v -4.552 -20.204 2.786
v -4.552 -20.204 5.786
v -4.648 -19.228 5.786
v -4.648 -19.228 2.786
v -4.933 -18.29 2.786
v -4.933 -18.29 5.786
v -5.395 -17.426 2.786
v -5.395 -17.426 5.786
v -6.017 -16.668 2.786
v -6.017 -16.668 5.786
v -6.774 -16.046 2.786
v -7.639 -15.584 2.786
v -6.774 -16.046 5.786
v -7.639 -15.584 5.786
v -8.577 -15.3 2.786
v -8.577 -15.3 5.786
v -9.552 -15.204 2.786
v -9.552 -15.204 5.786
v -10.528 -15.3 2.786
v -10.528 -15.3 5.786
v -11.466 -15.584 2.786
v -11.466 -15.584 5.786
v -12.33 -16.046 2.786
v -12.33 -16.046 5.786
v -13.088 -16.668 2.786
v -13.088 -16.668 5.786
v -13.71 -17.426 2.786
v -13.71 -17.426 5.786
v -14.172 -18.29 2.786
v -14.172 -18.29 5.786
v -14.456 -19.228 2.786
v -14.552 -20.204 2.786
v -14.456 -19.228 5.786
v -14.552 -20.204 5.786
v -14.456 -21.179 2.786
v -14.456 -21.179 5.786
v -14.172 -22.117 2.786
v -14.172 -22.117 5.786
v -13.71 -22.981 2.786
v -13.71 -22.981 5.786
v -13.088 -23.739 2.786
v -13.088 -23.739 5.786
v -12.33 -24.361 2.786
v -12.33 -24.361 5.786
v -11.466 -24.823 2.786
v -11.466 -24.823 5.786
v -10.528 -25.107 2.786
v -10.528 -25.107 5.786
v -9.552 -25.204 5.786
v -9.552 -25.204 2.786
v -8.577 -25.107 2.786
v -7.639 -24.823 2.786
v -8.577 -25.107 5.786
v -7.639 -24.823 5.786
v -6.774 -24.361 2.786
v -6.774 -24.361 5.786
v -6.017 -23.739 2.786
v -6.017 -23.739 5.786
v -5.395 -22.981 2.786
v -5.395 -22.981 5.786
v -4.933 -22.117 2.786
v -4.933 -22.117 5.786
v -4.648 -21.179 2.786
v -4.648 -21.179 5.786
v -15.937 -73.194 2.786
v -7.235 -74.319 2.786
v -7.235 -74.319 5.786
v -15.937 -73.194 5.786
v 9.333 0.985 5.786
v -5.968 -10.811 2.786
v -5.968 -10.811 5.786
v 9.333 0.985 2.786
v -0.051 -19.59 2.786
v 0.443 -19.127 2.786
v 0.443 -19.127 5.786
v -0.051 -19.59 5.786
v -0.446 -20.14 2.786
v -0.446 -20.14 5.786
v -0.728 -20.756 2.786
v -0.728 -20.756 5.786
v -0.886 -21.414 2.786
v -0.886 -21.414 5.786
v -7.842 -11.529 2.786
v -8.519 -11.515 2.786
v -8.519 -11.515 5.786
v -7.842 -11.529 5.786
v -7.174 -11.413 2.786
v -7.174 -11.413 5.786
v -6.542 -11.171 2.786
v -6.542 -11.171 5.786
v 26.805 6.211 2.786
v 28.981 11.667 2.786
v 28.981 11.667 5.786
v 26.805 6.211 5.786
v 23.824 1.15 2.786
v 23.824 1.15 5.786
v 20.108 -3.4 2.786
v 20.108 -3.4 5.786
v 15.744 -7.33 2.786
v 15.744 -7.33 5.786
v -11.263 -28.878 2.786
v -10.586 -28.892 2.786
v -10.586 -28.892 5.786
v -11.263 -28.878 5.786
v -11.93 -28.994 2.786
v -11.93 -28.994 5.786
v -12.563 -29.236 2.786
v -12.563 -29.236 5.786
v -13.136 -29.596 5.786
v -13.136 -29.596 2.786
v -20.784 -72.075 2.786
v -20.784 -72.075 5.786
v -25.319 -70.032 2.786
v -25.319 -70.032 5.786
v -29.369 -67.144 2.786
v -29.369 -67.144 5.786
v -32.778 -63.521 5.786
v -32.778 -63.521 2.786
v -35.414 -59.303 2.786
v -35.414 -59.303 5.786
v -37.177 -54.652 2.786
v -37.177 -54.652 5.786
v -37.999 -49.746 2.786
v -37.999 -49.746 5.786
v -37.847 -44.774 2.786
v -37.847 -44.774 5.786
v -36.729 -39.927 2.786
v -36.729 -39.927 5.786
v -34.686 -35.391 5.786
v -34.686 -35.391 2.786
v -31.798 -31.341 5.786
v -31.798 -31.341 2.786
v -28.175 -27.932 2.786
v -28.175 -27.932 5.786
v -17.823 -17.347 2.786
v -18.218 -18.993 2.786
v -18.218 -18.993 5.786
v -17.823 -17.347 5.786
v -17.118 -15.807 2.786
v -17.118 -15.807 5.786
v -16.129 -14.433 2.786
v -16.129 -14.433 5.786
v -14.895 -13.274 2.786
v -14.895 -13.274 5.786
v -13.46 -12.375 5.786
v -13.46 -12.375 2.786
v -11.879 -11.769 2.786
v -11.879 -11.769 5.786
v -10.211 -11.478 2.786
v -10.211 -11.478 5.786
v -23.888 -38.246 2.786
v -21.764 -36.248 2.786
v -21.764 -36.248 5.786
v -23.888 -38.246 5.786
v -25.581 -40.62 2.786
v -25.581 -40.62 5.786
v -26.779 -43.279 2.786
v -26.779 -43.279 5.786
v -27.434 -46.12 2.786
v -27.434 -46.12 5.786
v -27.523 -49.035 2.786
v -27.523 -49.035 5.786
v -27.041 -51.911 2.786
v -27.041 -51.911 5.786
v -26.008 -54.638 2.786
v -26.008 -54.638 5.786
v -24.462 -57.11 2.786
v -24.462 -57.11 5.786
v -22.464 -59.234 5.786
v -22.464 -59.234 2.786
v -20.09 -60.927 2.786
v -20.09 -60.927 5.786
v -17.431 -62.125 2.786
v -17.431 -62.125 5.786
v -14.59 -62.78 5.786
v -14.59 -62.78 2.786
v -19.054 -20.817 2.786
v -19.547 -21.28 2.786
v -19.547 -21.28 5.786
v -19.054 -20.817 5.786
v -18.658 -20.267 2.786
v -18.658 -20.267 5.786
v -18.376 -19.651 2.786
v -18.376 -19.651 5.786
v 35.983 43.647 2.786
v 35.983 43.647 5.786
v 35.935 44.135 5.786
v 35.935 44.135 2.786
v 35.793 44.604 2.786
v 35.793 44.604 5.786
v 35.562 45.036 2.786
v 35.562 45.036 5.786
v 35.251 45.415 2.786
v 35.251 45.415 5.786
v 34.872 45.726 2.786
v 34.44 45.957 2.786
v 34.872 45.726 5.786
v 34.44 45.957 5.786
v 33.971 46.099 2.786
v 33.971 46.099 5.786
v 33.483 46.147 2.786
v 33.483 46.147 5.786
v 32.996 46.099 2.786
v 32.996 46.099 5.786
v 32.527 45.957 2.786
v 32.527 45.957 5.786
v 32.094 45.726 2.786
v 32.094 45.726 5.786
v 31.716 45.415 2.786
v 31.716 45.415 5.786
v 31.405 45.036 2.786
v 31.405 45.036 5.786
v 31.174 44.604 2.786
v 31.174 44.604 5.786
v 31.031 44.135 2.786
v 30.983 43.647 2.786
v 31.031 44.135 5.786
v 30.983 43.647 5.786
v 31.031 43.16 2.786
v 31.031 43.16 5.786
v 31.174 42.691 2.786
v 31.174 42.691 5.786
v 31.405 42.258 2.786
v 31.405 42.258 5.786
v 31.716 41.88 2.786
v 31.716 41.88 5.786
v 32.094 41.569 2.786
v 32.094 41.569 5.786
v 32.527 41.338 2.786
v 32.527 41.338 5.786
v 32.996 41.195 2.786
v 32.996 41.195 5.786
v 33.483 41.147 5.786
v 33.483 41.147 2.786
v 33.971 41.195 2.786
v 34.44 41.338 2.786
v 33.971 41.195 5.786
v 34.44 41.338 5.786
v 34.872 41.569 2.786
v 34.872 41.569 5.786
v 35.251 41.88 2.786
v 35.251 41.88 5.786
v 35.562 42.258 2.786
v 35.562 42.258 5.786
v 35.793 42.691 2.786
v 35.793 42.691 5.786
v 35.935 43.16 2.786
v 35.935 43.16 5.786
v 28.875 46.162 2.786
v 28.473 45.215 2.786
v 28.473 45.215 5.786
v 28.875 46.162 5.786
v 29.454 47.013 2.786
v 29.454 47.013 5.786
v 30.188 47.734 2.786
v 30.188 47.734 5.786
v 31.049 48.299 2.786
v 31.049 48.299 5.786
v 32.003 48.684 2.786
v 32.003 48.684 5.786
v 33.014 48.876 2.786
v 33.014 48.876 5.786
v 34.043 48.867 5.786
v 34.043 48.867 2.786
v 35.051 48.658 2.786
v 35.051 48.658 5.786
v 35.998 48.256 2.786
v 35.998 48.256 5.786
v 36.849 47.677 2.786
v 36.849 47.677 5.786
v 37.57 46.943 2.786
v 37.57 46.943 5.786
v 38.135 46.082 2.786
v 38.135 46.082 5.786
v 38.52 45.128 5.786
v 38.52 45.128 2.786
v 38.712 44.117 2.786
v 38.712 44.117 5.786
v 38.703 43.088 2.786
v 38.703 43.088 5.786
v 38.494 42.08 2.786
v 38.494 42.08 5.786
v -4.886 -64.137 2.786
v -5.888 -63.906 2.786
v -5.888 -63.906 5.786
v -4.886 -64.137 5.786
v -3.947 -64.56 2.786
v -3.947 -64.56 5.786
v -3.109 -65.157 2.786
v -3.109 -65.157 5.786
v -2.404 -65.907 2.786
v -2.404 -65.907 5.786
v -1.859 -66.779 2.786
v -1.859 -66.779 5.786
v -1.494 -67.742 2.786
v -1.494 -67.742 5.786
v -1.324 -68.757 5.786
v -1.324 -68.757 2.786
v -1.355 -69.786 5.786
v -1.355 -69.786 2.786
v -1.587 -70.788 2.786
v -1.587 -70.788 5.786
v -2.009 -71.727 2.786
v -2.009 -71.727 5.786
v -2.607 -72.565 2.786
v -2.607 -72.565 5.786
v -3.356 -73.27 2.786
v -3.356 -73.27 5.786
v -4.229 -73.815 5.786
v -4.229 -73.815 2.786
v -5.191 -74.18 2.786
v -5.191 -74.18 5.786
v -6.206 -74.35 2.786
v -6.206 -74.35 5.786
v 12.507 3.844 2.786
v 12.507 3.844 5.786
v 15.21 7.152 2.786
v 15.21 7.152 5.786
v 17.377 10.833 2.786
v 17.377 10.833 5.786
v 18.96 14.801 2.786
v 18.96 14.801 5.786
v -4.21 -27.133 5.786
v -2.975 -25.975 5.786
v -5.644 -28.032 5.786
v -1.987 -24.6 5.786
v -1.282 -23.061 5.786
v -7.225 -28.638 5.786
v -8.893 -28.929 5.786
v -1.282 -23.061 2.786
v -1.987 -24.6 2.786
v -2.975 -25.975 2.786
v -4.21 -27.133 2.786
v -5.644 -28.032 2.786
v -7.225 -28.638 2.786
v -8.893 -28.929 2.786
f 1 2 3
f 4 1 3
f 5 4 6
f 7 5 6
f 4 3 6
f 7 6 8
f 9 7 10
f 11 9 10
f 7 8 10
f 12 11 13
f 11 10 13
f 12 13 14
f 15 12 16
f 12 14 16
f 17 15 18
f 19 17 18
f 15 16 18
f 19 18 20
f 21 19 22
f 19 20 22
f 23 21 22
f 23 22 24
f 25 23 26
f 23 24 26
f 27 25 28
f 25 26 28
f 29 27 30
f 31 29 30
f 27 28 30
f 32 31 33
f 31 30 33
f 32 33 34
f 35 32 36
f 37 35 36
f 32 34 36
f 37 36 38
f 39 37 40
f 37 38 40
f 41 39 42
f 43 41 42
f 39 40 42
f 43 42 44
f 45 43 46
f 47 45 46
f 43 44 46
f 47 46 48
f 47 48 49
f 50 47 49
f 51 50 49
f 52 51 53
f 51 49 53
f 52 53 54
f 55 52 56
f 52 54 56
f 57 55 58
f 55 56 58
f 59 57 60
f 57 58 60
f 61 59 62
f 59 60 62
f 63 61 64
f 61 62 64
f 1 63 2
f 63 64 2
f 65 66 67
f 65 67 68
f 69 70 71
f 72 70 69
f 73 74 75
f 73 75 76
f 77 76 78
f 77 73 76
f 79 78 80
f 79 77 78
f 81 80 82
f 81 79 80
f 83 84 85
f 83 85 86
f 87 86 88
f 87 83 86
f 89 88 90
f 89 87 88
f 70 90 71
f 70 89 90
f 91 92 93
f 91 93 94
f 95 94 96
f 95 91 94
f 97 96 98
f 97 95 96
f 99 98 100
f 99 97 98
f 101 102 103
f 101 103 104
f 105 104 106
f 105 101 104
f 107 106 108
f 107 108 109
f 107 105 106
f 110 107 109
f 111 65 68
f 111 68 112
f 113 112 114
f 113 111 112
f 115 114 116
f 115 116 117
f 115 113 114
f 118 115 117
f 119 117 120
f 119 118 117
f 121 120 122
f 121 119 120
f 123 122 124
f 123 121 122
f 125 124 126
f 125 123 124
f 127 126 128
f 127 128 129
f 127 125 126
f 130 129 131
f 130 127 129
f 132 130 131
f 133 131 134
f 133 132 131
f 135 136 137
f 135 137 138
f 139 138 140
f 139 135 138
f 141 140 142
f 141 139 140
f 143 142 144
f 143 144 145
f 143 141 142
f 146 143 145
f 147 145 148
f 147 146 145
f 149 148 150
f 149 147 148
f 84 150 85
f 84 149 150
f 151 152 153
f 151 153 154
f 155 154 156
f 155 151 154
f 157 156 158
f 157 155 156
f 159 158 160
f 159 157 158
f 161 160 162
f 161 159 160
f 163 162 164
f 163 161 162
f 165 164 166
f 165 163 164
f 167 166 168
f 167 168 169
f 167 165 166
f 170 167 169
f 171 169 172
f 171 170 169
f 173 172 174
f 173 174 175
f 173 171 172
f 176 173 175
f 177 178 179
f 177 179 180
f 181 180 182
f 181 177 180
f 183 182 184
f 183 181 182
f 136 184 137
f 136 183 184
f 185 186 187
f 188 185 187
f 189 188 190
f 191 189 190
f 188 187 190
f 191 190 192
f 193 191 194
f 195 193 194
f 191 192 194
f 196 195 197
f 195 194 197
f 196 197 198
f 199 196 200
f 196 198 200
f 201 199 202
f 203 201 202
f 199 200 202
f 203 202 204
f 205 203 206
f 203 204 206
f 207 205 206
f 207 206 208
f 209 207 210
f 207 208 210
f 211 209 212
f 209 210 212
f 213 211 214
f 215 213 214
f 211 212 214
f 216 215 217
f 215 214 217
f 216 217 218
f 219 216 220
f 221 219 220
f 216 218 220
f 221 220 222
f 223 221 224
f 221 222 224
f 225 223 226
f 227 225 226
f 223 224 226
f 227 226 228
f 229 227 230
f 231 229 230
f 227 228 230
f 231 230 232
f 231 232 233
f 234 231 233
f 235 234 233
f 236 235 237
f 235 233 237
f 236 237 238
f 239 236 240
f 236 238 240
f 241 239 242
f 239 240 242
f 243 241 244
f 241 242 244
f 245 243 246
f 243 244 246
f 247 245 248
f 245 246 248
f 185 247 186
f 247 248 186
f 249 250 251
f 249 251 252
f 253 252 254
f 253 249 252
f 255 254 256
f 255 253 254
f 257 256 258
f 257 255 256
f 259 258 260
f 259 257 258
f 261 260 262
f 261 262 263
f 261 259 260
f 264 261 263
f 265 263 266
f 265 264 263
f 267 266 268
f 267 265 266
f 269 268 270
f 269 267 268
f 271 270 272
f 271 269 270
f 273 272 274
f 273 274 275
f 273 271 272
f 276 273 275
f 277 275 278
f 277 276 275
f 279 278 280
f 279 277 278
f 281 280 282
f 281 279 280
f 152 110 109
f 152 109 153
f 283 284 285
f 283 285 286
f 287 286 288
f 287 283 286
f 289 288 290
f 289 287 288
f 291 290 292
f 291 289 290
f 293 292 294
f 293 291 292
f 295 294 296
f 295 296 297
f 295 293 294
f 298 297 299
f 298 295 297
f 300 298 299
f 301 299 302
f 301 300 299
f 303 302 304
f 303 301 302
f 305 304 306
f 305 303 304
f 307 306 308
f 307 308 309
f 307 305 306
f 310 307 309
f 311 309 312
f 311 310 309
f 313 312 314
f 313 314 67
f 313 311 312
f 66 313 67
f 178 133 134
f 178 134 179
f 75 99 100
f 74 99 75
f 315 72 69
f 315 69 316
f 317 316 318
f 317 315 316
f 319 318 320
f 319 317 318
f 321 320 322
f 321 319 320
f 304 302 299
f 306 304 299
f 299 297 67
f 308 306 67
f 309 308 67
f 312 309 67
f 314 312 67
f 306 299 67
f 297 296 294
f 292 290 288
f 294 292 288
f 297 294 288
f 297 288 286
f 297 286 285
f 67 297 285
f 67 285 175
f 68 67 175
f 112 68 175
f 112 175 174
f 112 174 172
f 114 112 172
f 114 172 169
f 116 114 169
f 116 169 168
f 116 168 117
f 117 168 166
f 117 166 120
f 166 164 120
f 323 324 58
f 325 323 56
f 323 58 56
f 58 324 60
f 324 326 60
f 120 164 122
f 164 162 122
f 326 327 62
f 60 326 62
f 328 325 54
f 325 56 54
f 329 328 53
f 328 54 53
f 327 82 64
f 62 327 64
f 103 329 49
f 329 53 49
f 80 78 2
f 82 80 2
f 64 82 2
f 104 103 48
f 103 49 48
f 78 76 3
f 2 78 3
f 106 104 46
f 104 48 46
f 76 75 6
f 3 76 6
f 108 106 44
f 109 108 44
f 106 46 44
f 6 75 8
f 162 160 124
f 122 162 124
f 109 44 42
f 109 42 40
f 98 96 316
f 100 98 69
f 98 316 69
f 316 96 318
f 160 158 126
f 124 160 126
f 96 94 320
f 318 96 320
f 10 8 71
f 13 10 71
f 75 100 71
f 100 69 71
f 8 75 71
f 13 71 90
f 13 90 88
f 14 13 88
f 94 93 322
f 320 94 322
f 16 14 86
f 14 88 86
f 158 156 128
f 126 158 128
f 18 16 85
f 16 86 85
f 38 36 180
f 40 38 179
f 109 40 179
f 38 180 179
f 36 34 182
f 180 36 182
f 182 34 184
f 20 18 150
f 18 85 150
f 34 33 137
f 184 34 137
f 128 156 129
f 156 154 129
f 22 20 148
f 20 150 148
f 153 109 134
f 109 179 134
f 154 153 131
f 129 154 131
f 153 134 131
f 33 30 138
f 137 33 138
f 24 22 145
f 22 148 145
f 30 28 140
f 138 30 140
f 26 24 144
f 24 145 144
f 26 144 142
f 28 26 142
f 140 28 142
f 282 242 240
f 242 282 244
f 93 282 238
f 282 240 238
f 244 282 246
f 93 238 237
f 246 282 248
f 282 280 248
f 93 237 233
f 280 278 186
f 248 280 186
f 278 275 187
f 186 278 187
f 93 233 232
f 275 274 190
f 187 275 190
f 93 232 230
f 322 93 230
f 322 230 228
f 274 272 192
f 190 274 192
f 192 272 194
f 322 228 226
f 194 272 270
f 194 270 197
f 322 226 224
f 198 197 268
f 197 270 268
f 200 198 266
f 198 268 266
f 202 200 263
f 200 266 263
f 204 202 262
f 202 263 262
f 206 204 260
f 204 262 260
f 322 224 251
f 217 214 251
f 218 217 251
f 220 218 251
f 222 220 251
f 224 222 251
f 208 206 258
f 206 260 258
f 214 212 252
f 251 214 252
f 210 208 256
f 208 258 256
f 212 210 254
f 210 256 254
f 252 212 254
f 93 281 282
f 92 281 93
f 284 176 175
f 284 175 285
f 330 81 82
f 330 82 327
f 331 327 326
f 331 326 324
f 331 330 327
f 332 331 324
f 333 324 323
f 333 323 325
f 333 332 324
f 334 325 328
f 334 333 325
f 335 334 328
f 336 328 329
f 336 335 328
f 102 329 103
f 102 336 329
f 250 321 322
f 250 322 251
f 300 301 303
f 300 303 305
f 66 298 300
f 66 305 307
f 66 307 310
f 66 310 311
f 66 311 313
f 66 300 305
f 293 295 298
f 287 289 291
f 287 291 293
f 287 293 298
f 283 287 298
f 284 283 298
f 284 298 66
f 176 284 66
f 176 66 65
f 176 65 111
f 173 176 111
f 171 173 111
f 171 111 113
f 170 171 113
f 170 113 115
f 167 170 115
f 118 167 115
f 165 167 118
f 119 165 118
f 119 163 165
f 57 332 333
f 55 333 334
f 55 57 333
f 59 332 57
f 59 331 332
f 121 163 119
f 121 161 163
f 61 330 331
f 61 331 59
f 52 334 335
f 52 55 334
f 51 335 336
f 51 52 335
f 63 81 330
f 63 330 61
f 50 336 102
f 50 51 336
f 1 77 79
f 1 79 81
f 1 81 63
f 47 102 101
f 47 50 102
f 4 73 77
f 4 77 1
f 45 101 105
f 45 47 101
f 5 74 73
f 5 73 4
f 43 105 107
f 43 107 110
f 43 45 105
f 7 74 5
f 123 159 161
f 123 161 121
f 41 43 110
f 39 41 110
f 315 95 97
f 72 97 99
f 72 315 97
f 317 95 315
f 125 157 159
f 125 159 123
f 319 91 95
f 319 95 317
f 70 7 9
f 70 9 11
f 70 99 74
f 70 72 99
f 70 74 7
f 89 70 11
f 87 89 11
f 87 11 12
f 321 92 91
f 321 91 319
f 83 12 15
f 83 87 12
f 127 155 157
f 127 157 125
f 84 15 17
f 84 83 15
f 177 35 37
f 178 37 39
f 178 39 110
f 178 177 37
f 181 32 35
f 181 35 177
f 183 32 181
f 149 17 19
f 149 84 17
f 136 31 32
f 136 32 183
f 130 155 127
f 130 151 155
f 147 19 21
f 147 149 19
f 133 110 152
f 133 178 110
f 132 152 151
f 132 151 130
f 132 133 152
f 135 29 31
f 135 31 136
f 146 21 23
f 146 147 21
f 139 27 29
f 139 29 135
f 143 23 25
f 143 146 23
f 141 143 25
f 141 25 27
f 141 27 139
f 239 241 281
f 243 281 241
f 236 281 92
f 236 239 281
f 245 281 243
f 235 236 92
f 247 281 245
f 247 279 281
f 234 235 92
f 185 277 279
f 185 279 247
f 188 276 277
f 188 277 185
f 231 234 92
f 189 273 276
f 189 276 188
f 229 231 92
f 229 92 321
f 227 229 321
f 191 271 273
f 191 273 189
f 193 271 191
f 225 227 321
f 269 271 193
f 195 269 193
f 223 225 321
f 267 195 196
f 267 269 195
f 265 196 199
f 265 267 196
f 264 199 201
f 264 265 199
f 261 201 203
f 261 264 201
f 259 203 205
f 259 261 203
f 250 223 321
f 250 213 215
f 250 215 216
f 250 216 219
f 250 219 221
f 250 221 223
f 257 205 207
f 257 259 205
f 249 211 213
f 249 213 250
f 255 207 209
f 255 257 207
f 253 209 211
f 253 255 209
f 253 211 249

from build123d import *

# Parameters (mm, degrees)
BOSS_EXTRUDE1_DEPTH = 8.571428571
SCALE1_SCALE        = 0.35
SKETCH4_R           = 5
SKETCH4_R_2         = 2.5
CUT_EXTRUDE1_DEPTH  = 3


with BuildPart() as part:
    # Sketch1 → Boss-Extrude1 (new body)
    with BuildSketch(Plane.XY):
        with BuildLine():
            Line((58.123111297, 76.596610431), (85.302723175, 163.49128587))
            ThreePointArc((85.302723175, 163.49128587), (104.096629497, 173.329430267), (113.934773893, 154.535523945))
            Line((113.934773893, 154.535523945), (86.755162015, 67.640848506))
            ThreePointArc((86.755162015, 67.640848506), (72.021658749, 37.591328154), (48.934001898, 13.363041111))
            Line((48.934001898, 13.363041111), (5.217217629, -20.341042592))
            ThreePointArc((5.217217629, -20.341042592), (2.676812565, -23.236266616), (1.419146317, -26.876906073))
            ThreePointArc((1.419146317, -26.876906073), (-8.076031964, -43.216564777), (-26.293681135, -48.242509049))
            ThreePointArc((-26.293681135, -48.242509049), (-30.134490911, -48.532613024), (-33.580740804, -50.252886758))
            Line((-33.580740804, -50.252886758), (-58.231756308, -69.257941768))
            ThreePointArc((-58.231756308, -69.257941768), (-73.309006949, -114.009842439), (-37.733455904, -145.065216667))
            Line((-37.733455904, -145.065216667), (-12.872173051, -148.280481329))
            ThreePointArc((-12.872173051, -148.280481329), (0.08003541, -165.080490138), (-16.719973399, -178.032698599))
            Line((-16.719973399, -178.032698599), (-41.581256252, -174.817433937))
            ThreePointArc((-41.581256252, -174.817433937), (-102.268960976, -121.840619078), (-76.548945176, -45.499141462))
            Line((-76.548945176, -45.499141462), (-51.897929672, -26.494086452))
            ThreePointArc((-51.897929672, -26.494086452), (-49.357524607, -23.598862428), (-48.09985836, -19.958222971))
            ThreePointArc((-48.09985836, -19.958222971), (-38.604680078, -3.618564267), (-20.387030907, 1.407380005))
            ThreePointArc((-20.387030907, 1.407380005), (-16.546221132, 1.69748398), (-13.099971239, 3.417757714))
            Line((-13.099971239, 3.417757714), (30.61681303, 37.121841417))
            ThreePointArc((30.61681303, 37.121841417), (47.407836194, 54.742413811), (58.123111297, 76.596610431))
        make_face()
    extrude(amount=BOSS_EXTRUDE1_DEPTH)


with BuildPart() as part_1:
    # Scale1: scaled about (-2.128000964, -18.472945164, 4.285714286)
    add(part.part.scale(SCALE1_SCALE).moved(Location((-1.383200627, -12.007414357, 2.785714286))))

    # Sketch4 → Cut-Extrude1 (cut)
    with BuildSketch(Plane.XY.offset(5.785714286)):
        with Locations((-9.552325234, -20.203561939)):
            Circle(SKETCH4_R)
        with Locations((33.48336136, 43.647277361)):
            Circle(SKETCH4_R_2)
    extrude(amount=-CUT_EXTRUDE1_DEPTH, mode=Mode.SUBTRACT)


solid = part_1.part
